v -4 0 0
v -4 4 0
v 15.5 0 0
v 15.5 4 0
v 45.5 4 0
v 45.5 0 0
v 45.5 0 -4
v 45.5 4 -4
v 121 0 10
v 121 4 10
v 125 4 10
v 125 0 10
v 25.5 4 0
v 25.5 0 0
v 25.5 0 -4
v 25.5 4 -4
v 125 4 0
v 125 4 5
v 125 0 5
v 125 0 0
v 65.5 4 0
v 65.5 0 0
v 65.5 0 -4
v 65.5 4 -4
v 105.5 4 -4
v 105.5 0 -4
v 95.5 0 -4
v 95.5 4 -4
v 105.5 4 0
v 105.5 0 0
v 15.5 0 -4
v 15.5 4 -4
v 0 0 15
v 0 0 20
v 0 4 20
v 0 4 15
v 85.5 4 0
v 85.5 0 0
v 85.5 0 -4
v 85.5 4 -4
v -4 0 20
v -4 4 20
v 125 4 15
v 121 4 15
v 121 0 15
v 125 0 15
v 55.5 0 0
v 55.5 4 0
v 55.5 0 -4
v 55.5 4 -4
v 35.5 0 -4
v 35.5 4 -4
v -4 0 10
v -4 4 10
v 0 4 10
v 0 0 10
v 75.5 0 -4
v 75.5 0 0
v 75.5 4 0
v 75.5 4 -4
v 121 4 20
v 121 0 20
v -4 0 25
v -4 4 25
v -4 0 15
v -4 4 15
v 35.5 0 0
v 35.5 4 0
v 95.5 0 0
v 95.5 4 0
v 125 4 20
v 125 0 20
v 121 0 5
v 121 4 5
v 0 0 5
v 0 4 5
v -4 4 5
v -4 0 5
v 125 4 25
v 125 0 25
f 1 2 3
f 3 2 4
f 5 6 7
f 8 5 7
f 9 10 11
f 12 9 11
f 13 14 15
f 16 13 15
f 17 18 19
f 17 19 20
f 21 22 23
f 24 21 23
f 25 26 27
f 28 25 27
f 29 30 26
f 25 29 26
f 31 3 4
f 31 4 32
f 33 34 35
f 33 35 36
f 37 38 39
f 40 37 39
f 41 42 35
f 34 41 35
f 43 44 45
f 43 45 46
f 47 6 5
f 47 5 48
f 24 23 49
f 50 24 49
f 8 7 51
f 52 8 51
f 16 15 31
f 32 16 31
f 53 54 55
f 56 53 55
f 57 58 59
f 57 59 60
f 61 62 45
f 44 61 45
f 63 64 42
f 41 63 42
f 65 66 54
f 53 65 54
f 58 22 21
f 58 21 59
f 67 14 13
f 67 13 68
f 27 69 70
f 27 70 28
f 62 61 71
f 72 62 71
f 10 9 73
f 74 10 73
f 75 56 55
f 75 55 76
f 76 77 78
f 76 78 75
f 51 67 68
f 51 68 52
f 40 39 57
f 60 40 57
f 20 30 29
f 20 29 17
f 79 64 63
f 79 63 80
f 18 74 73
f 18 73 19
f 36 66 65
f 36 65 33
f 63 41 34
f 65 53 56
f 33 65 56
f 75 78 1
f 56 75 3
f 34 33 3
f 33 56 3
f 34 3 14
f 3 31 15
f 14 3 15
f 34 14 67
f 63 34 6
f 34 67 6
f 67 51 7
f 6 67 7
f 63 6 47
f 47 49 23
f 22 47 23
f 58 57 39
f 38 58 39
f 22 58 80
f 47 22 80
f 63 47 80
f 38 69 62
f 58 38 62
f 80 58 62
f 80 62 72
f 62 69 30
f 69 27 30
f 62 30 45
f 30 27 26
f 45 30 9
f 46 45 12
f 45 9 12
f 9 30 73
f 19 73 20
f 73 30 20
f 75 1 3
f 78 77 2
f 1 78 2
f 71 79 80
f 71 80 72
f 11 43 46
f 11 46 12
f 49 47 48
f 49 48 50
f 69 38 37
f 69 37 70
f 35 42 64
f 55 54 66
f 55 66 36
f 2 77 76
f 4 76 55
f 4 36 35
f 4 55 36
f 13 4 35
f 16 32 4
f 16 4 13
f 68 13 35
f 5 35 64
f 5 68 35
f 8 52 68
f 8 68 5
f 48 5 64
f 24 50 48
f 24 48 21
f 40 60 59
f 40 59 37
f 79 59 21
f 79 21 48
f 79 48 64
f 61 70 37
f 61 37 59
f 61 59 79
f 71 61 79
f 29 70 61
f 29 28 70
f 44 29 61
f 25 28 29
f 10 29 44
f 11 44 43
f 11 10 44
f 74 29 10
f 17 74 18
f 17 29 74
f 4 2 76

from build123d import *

# Parameters (mm, degrees)
SKETCH1_W           = 121
SKETCH1_H           = 25
BOSS_EXTRUDE1_DEPTH = 4
SKETCH3_W           = 10
SKETCH3_H           = 4
BOSS_EXTRUDE3_DEPTH = 4
LPATTERN2_COUNT     = 3
LPATTERN2_PITCH     = 20
LPATTERN2_COL_COUNT = 3
LPATTERN2_COL_PITCH = 20
SKETCH4_W           = 4
SKETCH4_H           = 5
BOSS_EXTRUDE4_DEPTH = 4
LPATTERN3_COUNT     = 3
LPATTERN3_PITCH     = 10


with BuildPart() as part:
    # Sketch1 → Boss-Extrude1 (new body)
    with BuildSketch(Plane(origin=(0, 0, 0), x_dir=(1, 0, 0), z_dir=(0, 1, 0))):
        with Locations((60.5, -12.5)):
            Rectangle(SKETCH1_W, SKETCH1_H)
    extrude(amount=BOSS_EXTRUDE1_DEPTH)

    # Sketch3 → Boss-Extrude3 (add, through all)
    with BuildSketch(Plane(origin=(0, 0, 0), x_dir=(-1, 0, 0), z_dir=(0, -1, 0))):
        with Locations((-60.5, 2)):
            Rectangle(SKETCH3_W, SKETCH3_H)
    boss_extrude3 = extrude(amount=-BOSS_EXTRUDE3_DEPTH)

    # LPattern2: Boss-Extrude3 ×3
    with Locations(*[(i * LPATTERN2_PITCH, 0, 0) for i in range(1, LPATTERN2_COUNT)]):
        add(boss_extrude3)

    # LPattern2 col: Boss-Extrude3 ×3
    with Locations(*[(-i * LPATTERN2_COL_PITCH, 0, 0) for i in range(1, LPATTERN2_COL_COUNT)]):
        add(boss_extrude3)

    # Sketch4 → Boss-Extrude4 (add, through all)
    with BuildSketch(Plane(origin=(0, 4, 0), x_dir=(1, 0, 0), z_dir=(0, 1, 0))):
        with Locations((-2, -22.5)):
            Rectangle(SKETCH4_W, SKETCH4_H)
        with Locations((123, -22.5)):
            Rectangle(SKETCH4_W, SKETCH4_H)
    boss_extrude4 = extrude(amount=-BOSS_EXTRUDE4_DEPTH)

    # LPattern3: Boss-Extrude4 ×3
    with Locations(*[(0, 0, -i * LPATTERN3_PITCH) for i in range(1, LPATTERN3_COUNT)]):
        add(boss_extrude4)


solid = part.part
